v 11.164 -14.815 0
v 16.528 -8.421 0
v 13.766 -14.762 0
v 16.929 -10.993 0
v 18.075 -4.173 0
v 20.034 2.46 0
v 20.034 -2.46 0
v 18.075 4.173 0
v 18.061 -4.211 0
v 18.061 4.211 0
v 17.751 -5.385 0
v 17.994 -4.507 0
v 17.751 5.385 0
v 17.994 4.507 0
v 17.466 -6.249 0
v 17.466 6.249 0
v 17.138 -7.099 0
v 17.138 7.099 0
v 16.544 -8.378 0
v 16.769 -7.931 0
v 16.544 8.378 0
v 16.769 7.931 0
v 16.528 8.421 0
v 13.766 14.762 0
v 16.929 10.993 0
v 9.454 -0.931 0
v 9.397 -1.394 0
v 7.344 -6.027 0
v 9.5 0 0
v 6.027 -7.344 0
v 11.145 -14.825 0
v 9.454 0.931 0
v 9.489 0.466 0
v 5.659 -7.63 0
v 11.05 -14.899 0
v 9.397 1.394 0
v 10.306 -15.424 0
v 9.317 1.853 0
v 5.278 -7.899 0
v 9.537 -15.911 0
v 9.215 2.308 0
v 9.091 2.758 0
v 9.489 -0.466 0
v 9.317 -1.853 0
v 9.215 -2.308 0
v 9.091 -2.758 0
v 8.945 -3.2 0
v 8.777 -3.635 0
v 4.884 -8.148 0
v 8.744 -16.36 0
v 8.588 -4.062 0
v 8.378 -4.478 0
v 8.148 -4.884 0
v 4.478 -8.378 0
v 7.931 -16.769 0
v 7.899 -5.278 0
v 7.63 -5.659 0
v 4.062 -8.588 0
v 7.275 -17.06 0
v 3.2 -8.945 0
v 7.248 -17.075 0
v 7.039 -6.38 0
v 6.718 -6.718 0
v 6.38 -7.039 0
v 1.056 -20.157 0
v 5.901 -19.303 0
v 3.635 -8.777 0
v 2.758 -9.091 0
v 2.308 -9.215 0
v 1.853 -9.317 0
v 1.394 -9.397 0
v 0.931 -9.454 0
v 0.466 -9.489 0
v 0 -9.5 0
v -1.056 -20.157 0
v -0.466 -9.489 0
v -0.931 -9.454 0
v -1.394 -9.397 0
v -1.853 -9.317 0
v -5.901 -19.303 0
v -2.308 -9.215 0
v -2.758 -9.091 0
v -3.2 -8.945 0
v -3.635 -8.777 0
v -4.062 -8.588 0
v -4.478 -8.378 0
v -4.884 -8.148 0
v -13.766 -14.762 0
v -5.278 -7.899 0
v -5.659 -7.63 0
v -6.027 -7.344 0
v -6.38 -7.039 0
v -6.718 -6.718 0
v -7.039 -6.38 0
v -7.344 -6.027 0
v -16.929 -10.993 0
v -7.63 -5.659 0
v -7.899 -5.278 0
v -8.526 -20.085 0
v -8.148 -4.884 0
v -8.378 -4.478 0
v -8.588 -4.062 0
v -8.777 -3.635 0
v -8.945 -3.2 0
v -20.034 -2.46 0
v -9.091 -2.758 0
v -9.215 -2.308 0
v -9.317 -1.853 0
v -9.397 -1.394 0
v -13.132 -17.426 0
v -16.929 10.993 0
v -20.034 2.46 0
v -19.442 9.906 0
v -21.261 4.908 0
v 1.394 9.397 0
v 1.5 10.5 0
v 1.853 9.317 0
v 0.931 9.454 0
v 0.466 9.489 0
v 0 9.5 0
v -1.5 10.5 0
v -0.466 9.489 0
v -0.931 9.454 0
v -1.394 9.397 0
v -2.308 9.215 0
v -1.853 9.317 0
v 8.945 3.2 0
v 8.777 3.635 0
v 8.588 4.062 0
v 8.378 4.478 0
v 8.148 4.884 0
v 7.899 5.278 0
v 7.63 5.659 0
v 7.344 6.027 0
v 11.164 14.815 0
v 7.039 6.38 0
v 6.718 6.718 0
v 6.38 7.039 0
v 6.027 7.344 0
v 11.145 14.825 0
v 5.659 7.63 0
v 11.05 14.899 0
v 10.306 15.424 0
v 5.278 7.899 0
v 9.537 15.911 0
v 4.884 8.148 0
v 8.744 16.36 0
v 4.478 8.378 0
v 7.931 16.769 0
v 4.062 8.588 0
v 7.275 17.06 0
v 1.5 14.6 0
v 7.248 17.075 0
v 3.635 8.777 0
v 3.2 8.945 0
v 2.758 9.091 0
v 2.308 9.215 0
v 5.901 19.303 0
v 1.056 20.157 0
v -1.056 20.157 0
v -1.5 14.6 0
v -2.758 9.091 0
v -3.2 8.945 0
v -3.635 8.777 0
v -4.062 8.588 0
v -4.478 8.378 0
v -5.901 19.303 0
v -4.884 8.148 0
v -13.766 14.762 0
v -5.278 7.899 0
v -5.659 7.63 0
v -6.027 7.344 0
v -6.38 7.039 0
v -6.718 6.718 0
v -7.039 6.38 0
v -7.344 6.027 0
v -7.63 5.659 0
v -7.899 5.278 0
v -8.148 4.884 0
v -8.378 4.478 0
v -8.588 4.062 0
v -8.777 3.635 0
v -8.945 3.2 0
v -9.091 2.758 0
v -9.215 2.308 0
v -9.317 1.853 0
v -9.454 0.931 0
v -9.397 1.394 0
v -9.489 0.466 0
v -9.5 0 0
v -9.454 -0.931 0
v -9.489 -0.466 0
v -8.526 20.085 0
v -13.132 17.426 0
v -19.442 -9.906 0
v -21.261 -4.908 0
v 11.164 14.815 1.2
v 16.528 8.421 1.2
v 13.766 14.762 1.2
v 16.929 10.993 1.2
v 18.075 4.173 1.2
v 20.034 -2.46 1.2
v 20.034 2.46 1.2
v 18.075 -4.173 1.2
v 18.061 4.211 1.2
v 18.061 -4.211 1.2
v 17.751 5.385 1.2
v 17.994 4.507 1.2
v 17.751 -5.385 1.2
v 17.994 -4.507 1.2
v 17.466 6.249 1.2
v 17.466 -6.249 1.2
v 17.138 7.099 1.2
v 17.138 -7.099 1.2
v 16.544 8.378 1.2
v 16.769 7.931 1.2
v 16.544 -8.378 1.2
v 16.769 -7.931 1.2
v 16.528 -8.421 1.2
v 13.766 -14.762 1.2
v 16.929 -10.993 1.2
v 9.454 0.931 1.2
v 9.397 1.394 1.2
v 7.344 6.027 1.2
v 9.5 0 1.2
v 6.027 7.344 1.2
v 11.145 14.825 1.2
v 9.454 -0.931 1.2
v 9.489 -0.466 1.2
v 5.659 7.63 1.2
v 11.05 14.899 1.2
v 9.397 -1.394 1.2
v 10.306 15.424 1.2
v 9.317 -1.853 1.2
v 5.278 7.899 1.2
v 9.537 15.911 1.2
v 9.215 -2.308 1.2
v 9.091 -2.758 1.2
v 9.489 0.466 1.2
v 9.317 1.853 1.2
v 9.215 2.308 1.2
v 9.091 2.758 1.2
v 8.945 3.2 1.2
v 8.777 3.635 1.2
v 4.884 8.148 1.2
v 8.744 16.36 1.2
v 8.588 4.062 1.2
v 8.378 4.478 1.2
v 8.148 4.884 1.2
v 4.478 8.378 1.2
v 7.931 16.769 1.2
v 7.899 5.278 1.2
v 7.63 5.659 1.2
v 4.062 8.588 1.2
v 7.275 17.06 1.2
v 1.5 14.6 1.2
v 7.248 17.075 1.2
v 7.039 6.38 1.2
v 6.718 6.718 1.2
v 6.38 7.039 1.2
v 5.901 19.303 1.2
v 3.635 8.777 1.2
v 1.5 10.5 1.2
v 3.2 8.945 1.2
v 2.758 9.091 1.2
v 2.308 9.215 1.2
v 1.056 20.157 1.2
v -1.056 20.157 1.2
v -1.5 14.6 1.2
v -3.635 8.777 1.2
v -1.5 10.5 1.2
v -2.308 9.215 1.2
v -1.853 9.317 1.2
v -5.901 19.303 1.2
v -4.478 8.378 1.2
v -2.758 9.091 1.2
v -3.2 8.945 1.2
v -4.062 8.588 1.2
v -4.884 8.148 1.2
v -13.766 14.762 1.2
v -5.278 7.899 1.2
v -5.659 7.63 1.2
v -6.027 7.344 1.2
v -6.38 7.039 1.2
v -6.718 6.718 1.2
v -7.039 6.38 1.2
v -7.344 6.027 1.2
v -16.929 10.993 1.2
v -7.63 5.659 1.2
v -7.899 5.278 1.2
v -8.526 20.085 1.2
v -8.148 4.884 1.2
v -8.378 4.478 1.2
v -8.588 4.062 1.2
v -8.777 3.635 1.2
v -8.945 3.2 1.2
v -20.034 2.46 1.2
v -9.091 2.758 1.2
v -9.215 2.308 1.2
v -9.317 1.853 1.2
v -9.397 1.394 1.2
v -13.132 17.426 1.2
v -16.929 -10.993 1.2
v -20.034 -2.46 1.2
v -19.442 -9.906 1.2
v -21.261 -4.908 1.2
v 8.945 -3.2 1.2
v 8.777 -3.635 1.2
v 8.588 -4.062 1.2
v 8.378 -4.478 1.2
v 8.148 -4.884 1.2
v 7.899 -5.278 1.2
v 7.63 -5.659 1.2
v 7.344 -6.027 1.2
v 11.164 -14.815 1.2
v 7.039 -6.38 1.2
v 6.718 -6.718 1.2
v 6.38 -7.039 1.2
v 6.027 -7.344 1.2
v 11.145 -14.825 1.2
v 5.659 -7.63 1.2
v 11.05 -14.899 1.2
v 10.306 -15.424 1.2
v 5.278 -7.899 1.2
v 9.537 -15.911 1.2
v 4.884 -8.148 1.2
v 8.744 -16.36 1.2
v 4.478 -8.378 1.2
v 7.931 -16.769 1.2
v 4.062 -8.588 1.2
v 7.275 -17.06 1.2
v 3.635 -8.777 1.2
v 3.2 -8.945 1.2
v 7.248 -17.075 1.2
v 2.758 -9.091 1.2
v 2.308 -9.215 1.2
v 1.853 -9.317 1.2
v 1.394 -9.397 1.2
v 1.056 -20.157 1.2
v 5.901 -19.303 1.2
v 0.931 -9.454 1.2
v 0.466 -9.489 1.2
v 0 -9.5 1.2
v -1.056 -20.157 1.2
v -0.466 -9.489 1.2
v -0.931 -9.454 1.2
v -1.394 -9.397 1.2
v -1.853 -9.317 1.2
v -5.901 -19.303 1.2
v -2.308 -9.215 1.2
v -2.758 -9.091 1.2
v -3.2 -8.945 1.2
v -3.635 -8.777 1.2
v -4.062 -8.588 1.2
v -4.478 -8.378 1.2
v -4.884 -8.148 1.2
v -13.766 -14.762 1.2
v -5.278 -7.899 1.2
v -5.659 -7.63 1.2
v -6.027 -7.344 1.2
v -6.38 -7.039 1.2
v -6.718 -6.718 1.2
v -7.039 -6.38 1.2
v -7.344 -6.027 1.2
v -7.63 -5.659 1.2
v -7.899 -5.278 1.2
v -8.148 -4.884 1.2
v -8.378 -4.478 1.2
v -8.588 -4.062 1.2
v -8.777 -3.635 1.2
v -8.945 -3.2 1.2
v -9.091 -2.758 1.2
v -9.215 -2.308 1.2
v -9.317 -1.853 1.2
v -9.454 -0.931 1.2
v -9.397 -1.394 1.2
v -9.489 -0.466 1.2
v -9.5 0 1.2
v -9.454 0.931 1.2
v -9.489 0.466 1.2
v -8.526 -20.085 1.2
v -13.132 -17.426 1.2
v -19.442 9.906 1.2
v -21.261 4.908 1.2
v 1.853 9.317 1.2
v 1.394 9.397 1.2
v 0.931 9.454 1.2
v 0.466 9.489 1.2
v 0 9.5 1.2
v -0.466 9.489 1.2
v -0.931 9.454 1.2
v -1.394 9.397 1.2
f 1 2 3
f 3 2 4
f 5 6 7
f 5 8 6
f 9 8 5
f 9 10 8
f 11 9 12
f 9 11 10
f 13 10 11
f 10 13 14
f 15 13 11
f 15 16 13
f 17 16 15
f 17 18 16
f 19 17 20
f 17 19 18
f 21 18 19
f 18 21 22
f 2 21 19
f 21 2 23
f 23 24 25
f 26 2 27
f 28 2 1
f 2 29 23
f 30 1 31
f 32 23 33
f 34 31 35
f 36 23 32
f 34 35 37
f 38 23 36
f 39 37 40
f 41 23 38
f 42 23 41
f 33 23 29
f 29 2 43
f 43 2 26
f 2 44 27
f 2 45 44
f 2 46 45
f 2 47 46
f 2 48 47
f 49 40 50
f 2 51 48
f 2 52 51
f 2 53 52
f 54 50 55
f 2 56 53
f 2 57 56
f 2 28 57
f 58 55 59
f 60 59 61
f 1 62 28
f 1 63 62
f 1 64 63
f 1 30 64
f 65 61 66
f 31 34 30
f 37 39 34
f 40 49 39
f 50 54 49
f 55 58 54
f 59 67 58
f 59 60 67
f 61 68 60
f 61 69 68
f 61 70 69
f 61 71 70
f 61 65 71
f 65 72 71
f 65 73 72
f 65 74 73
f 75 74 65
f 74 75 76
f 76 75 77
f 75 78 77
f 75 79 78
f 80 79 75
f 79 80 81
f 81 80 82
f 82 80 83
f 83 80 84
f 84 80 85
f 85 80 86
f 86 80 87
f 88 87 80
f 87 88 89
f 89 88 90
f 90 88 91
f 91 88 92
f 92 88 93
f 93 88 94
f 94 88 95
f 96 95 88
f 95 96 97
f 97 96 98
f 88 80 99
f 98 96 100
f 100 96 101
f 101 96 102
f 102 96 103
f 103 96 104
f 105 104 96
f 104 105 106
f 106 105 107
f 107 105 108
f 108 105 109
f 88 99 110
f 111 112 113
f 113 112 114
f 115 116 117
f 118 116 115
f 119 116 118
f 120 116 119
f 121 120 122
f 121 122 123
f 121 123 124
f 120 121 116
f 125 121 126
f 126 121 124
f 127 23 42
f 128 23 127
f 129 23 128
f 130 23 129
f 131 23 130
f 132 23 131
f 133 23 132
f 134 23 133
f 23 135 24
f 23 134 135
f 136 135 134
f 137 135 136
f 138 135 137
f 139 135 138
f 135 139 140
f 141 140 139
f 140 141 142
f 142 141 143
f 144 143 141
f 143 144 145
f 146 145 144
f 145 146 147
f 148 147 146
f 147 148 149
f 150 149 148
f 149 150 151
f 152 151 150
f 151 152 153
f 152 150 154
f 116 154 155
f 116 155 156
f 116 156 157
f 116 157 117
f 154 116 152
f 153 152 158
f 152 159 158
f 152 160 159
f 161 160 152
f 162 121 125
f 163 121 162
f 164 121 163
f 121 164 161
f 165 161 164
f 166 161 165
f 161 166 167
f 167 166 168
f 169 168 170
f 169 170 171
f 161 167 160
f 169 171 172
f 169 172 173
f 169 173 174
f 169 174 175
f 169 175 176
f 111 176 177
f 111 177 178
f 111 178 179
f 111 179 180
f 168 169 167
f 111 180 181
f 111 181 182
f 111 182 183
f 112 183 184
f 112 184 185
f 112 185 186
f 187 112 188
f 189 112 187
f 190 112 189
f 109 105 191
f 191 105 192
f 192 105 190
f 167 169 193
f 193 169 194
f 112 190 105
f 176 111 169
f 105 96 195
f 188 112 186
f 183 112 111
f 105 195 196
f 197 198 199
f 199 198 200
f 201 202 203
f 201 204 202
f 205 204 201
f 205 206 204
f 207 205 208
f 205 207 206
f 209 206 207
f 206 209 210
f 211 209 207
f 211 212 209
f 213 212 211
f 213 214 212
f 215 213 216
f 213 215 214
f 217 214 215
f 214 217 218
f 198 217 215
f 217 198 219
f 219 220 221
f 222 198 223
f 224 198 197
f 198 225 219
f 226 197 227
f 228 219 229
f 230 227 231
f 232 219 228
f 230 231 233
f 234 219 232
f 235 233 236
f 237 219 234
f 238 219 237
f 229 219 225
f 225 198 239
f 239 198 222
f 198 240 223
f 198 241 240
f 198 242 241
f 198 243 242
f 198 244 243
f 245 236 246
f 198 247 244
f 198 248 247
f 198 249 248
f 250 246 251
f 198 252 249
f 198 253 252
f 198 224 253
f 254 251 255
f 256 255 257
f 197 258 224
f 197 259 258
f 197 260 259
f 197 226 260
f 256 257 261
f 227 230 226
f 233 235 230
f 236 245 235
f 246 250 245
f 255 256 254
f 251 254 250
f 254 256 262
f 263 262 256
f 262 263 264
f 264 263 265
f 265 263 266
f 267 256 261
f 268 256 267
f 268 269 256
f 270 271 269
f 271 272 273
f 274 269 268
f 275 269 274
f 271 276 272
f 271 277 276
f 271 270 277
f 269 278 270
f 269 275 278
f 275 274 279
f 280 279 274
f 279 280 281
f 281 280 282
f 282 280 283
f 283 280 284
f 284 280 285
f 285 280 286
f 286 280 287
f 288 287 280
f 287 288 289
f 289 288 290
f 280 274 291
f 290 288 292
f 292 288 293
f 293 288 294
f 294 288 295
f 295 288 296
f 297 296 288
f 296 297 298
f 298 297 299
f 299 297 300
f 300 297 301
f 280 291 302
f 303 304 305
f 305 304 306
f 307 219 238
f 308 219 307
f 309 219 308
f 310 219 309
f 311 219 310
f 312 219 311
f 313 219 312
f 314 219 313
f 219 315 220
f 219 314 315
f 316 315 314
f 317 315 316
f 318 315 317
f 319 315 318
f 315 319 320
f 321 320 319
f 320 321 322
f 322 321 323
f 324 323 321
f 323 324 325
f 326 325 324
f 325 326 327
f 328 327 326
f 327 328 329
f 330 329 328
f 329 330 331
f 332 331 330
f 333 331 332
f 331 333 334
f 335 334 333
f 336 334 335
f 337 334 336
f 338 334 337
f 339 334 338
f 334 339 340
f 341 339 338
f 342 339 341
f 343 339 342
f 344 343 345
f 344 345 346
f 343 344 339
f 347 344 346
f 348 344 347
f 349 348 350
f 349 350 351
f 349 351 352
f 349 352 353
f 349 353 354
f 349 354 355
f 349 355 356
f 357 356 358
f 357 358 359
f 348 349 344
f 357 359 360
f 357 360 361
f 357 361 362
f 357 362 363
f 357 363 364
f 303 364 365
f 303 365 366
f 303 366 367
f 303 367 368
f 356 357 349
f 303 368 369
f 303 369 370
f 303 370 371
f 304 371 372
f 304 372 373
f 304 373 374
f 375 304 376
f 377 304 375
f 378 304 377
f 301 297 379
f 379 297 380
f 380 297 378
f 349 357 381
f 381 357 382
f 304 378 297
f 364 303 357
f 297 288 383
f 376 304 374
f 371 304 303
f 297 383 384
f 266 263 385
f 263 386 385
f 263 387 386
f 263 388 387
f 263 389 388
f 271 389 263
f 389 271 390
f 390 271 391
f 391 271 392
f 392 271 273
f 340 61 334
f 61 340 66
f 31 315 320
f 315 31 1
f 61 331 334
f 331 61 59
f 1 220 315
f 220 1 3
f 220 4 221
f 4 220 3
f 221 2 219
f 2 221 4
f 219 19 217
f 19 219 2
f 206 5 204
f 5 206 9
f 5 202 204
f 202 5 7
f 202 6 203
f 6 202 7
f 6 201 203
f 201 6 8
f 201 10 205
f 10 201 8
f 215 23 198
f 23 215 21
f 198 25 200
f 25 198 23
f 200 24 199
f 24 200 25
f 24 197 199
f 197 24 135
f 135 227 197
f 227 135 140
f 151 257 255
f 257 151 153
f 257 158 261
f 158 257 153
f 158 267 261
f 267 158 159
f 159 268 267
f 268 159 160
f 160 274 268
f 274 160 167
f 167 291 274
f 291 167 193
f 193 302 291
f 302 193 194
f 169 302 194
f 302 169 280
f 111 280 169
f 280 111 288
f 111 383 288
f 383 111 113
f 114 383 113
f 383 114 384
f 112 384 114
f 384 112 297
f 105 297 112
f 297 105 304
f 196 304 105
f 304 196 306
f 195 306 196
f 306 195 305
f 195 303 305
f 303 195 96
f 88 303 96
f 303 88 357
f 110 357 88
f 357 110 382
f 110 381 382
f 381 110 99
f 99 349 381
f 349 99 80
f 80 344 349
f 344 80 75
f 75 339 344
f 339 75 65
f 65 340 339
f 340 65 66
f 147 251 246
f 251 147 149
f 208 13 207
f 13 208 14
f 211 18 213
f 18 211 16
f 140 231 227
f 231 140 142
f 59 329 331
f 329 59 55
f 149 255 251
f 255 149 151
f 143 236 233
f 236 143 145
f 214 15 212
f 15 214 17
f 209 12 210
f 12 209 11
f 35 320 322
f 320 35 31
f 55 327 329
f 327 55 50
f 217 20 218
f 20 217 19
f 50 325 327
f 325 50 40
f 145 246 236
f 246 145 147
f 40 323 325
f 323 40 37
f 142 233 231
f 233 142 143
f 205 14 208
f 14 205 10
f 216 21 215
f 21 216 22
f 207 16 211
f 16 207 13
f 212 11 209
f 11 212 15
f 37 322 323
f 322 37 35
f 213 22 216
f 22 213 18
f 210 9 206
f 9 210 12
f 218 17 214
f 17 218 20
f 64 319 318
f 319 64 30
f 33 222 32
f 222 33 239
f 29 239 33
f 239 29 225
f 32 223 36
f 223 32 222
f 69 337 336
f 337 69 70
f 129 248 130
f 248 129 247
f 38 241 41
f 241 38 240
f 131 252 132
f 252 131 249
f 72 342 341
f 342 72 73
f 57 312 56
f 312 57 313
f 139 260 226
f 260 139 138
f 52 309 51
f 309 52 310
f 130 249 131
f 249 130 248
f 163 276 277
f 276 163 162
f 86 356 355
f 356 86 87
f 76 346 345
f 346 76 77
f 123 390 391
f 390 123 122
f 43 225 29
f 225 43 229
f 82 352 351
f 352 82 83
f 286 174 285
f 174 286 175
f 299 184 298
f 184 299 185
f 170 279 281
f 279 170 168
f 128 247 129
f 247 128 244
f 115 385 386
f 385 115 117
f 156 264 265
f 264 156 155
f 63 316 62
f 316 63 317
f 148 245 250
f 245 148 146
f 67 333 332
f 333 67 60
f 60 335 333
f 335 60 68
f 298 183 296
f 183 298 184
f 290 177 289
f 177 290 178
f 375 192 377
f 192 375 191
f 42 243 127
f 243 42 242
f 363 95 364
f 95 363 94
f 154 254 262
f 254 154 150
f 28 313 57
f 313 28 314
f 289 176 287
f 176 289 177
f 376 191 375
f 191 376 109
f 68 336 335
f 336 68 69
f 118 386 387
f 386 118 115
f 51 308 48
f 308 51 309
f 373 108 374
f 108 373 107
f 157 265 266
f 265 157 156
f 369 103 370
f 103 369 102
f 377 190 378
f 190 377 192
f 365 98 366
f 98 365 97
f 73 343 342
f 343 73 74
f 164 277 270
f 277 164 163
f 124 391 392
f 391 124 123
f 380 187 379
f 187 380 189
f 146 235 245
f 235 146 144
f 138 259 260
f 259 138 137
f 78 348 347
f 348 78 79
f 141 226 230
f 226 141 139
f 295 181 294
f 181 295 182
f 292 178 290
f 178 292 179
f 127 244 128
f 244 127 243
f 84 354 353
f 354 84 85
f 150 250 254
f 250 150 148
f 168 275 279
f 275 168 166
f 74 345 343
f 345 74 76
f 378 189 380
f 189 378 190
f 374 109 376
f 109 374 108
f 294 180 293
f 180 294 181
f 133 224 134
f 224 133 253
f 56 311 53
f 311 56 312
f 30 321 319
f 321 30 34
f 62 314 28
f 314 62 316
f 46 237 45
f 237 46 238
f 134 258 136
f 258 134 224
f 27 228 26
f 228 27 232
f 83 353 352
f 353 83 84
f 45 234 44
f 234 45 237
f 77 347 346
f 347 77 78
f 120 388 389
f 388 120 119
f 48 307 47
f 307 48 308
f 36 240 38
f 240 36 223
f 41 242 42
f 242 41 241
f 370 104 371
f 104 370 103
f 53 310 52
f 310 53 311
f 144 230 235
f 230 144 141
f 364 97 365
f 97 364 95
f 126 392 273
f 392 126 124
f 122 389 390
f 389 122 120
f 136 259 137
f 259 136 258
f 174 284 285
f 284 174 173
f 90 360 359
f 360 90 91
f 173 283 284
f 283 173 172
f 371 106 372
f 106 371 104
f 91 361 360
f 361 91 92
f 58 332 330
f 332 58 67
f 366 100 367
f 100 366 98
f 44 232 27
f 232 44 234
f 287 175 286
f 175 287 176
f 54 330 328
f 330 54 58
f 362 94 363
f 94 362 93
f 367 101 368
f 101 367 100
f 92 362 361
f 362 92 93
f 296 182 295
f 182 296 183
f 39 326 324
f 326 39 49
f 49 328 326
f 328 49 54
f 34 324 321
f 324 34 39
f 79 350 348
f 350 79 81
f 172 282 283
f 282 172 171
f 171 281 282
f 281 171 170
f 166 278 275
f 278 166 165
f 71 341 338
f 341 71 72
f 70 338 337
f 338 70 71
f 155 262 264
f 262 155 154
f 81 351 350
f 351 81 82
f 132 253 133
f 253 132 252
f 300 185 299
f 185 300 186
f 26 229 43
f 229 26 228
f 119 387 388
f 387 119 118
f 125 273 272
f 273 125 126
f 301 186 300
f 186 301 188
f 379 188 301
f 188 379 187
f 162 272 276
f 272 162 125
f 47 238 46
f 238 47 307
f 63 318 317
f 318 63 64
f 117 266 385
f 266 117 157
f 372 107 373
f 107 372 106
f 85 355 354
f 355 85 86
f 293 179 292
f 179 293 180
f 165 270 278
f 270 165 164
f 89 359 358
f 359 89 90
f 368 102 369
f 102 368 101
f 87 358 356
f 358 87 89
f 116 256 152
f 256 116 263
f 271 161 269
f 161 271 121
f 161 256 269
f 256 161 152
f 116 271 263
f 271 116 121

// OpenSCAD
/*
  Elna Supermatic cam 13
  Name: Source profile 13
  Status: source-profile

  Generated from measured parametric base v2.
  Surface mode: stepped
*/

include <_elna_measured_common.scad>;

profile_points = [
        [1.0564, 20.1573],
        [5.9015, 19.3030],
        [7.2481, 17.0754],
        [11.1637, 14.8147],
        [13.7661, 14.7624],
        [16.9286, 10.9935],
        [16.5282, 8.4215],
        [18.0746, 4.1728],
        [20.0345, 2.4599],
        [20.0345, -2.4599],
        [18.0746, -4.1728],
        [16.5282, -8.4215],
        [16.9286, -10.9935],
        [13.7661, -14.7624],
        [11.1637, -14.8147],
        [7.2481, -17.0754],
        [5.9015, -19.3030],
        [1.0564, -20.1573],
        [-1.0564, -20.1573],
        [-5.9015, -19.3030],
        [-8.5258, -20.0854],
        [-13.1316, -17.4262],
        [-13.7661, -14.7624],
        [-16.9286, -10.9935],
        [-19.4418, -9.9061],
        [-21.2608, -4.9084],
        [-20.0345, -2.4599],
        [-20.0345, 2.4599],
        [-21.2608, 4.9084],
        [-19.4418, 9.9061],
        [-16.9286, 10.9935],
        [-13.7661, 14.7624],
        [-13.1316, 17.4262],
        [-8.5258, 20.0854],
        [-5.9015, 19.3030],
        [-1.0564, 20.1573]
];

icon_points = [[-1.000,0.180], [-0.820,0.180], [-0.820,0.360], [-0.640,0.360], [-0.640,0.560], [-0.460,0.560], [-0.460,0.740], [-0.280,0.740], [-0.280,0.560], [-0.100,0.560], [-0.100,0.360], [0.080,0.360], [0.080,0.180], [0.260,0.180], [0.260,0.360], [0.440,0.360], [0.440,0.560], [0.620,0.560], [0.620,0.740], [0.800,0.740], [1.000,0.740]];

elna_cam_ring(profile_points=profile_points);
